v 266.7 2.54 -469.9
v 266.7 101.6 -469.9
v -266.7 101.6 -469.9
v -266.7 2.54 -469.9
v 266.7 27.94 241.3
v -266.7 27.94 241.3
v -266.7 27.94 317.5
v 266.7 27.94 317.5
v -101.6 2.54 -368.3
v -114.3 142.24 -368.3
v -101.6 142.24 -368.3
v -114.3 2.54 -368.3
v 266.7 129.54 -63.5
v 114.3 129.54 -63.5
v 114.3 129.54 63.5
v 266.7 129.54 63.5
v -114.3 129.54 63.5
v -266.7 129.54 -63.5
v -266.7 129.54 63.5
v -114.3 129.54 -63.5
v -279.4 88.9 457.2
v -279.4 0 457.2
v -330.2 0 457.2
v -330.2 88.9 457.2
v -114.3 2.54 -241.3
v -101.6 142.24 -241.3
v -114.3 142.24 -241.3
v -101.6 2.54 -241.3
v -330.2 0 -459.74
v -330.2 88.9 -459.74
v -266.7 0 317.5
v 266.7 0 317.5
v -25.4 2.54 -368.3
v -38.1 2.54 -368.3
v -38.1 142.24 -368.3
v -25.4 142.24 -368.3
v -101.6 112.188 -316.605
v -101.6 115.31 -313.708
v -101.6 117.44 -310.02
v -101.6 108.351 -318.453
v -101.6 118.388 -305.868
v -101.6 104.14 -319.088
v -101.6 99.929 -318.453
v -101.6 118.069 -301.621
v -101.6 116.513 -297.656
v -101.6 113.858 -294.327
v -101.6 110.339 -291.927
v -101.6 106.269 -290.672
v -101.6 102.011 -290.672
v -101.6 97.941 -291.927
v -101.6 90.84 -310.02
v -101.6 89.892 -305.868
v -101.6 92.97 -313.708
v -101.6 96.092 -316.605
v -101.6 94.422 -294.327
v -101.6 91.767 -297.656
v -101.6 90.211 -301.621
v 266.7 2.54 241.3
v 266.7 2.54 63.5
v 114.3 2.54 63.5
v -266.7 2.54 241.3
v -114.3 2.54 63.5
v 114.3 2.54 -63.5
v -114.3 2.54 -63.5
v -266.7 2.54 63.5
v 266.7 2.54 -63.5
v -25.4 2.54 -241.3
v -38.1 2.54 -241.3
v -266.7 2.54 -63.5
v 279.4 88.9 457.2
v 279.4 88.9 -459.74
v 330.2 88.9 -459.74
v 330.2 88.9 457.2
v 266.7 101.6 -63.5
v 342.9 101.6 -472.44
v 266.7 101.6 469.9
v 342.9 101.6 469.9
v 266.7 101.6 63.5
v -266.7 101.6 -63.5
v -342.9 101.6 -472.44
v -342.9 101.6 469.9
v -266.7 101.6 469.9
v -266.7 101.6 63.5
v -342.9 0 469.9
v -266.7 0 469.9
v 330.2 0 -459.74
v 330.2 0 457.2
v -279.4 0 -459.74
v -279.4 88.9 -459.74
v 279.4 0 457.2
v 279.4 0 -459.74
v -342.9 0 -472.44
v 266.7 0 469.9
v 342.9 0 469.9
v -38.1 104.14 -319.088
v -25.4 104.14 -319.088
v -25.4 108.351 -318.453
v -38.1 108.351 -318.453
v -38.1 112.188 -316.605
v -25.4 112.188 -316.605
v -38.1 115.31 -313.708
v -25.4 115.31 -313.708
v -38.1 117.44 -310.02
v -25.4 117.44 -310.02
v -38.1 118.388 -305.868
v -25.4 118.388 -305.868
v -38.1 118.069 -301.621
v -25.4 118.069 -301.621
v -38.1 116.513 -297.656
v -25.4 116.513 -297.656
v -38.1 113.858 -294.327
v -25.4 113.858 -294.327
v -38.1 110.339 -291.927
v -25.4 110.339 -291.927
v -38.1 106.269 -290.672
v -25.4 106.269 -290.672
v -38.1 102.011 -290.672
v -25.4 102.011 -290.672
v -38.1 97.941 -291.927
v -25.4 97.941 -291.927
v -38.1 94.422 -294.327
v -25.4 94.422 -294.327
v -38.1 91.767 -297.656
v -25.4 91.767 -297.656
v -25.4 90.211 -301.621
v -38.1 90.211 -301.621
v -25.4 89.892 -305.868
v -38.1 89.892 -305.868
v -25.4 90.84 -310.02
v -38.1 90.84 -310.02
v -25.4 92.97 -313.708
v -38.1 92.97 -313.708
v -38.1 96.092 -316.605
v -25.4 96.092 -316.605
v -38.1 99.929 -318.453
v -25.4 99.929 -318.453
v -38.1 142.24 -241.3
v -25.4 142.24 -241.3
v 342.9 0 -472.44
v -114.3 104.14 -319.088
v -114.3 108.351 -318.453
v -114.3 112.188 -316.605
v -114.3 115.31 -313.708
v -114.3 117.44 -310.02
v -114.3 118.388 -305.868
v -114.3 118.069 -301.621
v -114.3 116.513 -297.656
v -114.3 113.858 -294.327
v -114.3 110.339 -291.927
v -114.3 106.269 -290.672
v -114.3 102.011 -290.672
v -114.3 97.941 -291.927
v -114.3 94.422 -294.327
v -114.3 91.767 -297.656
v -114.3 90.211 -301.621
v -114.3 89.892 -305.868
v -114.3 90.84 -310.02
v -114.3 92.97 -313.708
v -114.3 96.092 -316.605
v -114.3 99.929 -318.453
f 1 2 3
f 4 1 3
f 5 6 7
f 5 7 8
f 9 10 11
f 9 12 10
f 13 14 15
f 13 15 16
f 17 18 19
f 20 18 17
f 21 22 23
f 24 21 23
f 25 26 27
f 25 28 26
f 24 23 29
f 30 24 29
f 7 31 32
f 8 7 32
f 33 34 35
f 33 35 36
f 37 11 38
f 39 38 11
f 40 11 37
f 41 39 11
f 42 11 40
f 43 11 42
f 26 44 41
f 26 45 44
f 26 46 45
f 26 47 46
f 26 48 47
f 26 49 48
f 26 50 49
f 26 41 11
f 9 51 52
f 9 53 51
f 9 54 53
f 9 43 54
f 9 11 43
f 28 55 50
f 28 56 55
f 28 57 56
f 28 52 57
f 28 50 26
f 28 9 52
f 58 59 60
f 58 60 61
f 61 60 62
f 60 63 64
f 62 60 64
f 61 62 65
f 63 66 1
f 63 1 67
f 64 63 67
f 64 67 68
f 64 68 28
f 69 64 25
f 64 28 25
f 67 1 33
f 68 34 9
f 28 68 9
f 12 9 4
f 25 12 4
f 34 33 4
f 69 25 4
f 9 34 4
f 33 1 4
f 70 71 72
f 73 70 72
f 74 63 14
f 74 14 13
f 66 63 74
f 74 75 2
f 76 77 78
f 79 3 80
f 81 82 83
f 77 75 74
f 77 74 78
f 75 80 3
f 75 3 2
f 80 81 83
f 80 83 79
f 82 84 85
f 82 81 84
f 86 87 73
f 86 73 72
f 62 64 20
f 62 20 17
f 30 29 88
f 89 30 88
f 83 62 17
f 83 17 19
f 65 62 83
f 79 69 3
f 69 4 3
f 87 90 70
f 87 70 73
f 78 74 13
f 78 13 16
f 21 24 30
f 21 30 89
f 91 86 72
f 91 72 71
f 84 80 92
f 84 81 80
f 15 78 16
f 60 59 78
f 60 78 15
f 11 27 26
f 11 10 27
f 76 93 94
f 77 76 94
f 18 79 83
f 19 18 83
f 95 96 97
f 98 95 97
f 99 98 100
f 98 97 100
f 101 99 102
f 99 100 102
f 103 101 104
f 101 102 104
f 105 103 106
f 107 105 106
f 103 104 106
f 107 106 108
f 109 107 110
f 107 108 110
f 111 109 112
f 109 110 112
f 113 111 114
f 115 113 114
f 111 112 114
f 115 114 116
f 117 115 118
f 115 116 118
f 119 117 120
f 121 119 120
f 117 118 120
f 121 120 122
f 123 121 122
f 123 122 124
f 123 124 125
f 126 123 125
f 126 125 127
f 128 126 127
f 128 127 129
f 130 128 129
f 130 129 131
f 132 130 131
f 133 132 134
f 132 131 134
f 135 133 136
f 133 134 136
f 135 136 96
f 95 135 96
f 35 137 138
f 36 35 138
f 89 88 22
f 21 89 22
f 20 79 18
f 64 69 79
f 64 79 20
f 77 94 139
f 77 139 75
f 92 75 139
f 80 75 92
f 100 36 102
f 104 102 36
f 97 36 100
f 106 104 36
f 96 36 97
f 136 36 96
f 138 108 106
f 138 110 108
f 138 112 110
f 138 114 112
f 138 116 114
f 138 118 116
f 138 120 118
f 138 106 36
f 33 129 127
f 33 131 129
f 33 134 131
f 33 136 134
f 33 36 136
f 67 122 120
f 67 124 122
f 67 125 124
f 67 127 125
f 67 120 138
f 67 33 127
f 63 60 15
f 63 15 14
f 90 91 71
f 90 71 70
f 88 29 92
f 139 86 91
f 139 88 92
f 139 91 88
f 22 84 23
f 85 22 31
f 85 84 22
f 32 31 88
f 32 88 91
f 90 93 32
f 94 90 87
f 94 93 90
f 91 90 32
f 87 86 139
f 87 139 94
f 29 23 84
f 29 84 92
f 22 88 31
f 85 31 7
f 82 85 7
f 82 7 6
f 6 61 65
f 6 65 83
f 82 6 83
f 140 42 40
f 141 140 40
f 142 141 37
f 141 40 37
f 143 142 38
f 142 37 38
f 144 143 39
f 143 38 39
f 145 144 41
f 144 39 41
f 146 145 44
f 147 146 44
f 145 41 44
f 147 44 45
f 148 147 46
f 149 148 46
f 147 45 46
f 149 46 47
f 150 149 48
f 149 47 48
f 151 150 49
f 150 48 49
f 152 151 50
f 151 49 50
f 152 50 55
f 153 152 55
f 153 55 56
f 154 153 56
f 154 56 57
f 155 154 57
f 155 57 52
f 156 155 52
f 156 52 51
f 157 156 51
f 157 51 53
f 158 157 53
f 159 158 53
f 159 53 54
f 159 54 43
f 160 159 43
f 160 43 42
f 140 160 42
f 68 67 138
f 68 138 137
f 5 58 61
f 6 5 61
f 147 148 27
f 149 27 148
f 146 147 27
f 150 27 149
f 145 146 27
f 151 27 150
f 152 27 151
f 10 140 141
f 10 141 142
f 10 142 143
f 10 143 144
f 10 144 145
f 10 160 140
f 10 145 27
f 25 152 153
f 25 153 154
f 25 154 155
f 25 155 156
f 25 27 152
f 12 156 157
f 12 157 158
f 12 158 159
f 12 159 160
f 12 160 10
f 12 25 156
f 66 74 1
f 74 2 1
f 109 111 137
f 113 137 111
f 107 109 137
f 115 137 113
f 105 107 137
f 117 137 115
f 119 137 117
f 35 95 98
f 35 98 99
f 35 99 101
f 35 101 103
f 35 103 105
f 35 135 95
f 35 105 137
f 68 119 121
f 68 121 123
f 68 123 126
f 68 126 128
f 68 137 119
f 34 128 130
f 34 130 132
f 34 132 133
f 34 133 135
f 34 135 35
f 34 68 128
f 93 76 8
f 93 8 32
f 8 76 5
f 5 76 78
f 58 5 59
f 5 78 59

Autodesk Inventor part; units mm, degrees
ref_plane "YZ Plane" through (0, 0, 0) normal (1, 0, 0) x (0, 1, 0)
ref_plane "XZ Plane" through (0, 0, 0) normal (0, 1, 0) x (-1, 0, 0)
ref_plane "XY Plane" through (0, 0, 0) normal (0, 0, 1) x (1, 0, 0)
sketch "Sketch1" plane through (0, 0, 0) normal (0, 0, 1) x (1, 0, 0)
  line L0 (-266.7, 101.6) -> (-342.9, 101.6)
  line L1 (-342.9, 101.6) -> (-342.9, 0)
  line L2 (-342.9, 0) -> (342.9, 0)
  line L3 (342.9, 0) -> (342.9, 101.6)
  line L4 (342.9, 101.6) -> (266.7, 101.6)
  line L5 (266.7, 101.6) -> (266.7, 2.54)
  line L6 (266.7, 2.54) -> (-266.7, 2.54)
  line L7 (-266.7, 2.54) -> (-266.7, 101.6)
  point P0 (0, 0)
  point P1 (0, 0)
  point P2 (0, 2.54)
  dimension "d0" = 685.8
  dimension "d1" = 101.6
  dimension "d2" = 76.2
  dimension "d3" = 2.54
extrude "Extrusion1" add sketch "Sketch1" along normal mid plane 939.8
sketch "Sketch2" plane through (0, 0, -469.9) normal (0, 0, -1) x (-1, 0, 0)
  line L0 (-342.9, 0) -> (-342.9, 101.6) projected
  line L1 (342.9, 0) -> (-342.9, 0) projected
  line L2 (-342.9, 101.6) -> (342.9, 101.6)
  line L3 (342.9, 101.6) -> (342.9, 0)
  line L4 (342.9, 0) -> (-342.9, 0)
  line L5 (-342.9, 0) -> (-342.9, 101.6)
  point P0 (0, 0)
extrude "Extrusion2" add sketch "Sketch2" along normal blind 2.54
sketch "Sketch3" plane through (-266.7, 2.54, 469.9) normal (0, 1, 0) x (1, 0, 0)
  line L0 (0, 0) -> (533.4, 0) projected
  line L1 (533.4, 939.8) -> (533.4, 0) projected
  line L2 (0, 939.8) -> (0, 0) projected
  line L3 (0, 152.4) -> (533.4, 152.4)
  line L4 (533.4, 152.4) -> (533.4, 228.6)
  line L5 (533.4, 228.6) -> (0, 228.6)
  line L6 (0, 228.6) -> (0, 152.4)
  line L7 (0, 533.4) -> (152.4, 533.4)
  line L8 (152.4, 533.4) -> (152.4, 406.4)
  line L9 (152.4, 406.4) -> (0, 406.4)
  line L10 (0, 406.4) -> (0, 533.4)
  line L11 (381, 533.4) -> (533.4, 533.4)
  line L12 (533.4, 533.4) -> (533.4, 406.4)
  line L13 (533.4, 406.4) -> (381, 406.4)
  line L14 (381, 406.4) -> (381, 533.4)
  point P0 (266.7, 469.9)
  point P1 (152.4, 469.9)
  dimension "d8" = 76.2
  dimension "d9" = 152.4
  dimension "d31" = 152.4
  dimension "d32" = 127
extrude "Extrusion7" cut sketch "Sketch3" against normal up to next contours L2 L3 L1 L0
extrude "Extrusion3" add sketch "Sketch3" along normal blind 25.4 contours L2 L5 L1 L3
extrude "Extrusion8" add sketch "Sketch3" along normal blind 127 contours L2 L7 L8 L9 | L13 L14 L11 L1
sketch "Sketch4" plane through (-342.9, 0, 469.9) normal (0, -1, 0) x (1, 0, 0)
  line L0 (685.8, 0) -> (0, 0) projected
  line L1 (0, -942.34) -> (0, 0) projected
  line L2 (0, -942.34) -> (685.8, -942.34) projected
  line L3 (76.2, -939.8) -> (76.2, -228.6) projected
  line L4 (342.9, -469.9) -> (342.9, 0) construction
  line L5 (12.7, -929.64) -> (63.5, -929.64)
  line L6 (63.5, -929.64) -> (63.5, -12.7)
  line L7 (63.5, -12.7) -> (12.7, -12.7)
  line L8 (12.7, -12.7) -> (12.7, -929.64)
  line L9 (673.1, -929.64) -> (622.3, -929.64)
  line L10 (622.3, -929.64) -> (622.3, -12.7)
  line L11 (622.3, -12.7) -> (673.1, -12.7)
  line L12 (673.1, -12.7) -> (673.1, -929.64)
  dimension "d12" = 12.7
  dimension "d13" = 12.7
  dimension "d14" = 12.7
  dimension "d15" = 12.7
extrude "Extrusion4" cut sketch "Sketch4" against normal blind 88.9
sketch "Sketch5" plane through (-266.7, 2.54, -469.9) normal (0, 1, 0) x (1, 0, 0)
  line L0 (533.4, 0) -> (0, 0) projected
  line L1 (0, 0) -> (0, -711.2) projected
  line L2 (152.4, -101.6) -> (165.1, -101.6)
  line L3 (165.1, -101.6) -> (165.1, -228.6)
  line L4 (165.1, -228.6) -> (152.4, -228.6)
  line L5 (152.4, -228.6) -> (152.4, -101.6)
  line L6 (228.6, -101.6) -> (241.3, -101.6)
  line L7 (241.3, -101.6) -> (241.3, -228.6)
  line L8 (241.3, -228.6) -> (228.6, -228.6)
  line L9 (228.6, -228.6) -> (228.6, -101.6)
  point P0 (266.7, -469.9)
  dimension "d18" = 12.7
  dimension "d19" = 127
  dimension "d20" = 63.5
  dimension "d21" = 152.4
  dimension "d22" = 101.6
extrude "Extrusion5" add sketch "Sketch5" along normal blind 139.7
sketch "Sketch6" plane through (-25.4, 2.54, -241.3) normal (1, 0, 0) x (0, 0, -1)
  line L0 (127, 139.7) -> (0, 139.7) projected
  circle A0 centre (63.5, 101.6) radius 14.2875
  point P0 (-241.3, -2.54)
  point P1 (63.5, 139.7)
  dimension "d25" = 28.575
  dimension "d26" = 38.1
extrude "Extrusion6" cut sketch "Sketch6" against normal up to surface (88.9 mm away)
properties part number "Concept"
